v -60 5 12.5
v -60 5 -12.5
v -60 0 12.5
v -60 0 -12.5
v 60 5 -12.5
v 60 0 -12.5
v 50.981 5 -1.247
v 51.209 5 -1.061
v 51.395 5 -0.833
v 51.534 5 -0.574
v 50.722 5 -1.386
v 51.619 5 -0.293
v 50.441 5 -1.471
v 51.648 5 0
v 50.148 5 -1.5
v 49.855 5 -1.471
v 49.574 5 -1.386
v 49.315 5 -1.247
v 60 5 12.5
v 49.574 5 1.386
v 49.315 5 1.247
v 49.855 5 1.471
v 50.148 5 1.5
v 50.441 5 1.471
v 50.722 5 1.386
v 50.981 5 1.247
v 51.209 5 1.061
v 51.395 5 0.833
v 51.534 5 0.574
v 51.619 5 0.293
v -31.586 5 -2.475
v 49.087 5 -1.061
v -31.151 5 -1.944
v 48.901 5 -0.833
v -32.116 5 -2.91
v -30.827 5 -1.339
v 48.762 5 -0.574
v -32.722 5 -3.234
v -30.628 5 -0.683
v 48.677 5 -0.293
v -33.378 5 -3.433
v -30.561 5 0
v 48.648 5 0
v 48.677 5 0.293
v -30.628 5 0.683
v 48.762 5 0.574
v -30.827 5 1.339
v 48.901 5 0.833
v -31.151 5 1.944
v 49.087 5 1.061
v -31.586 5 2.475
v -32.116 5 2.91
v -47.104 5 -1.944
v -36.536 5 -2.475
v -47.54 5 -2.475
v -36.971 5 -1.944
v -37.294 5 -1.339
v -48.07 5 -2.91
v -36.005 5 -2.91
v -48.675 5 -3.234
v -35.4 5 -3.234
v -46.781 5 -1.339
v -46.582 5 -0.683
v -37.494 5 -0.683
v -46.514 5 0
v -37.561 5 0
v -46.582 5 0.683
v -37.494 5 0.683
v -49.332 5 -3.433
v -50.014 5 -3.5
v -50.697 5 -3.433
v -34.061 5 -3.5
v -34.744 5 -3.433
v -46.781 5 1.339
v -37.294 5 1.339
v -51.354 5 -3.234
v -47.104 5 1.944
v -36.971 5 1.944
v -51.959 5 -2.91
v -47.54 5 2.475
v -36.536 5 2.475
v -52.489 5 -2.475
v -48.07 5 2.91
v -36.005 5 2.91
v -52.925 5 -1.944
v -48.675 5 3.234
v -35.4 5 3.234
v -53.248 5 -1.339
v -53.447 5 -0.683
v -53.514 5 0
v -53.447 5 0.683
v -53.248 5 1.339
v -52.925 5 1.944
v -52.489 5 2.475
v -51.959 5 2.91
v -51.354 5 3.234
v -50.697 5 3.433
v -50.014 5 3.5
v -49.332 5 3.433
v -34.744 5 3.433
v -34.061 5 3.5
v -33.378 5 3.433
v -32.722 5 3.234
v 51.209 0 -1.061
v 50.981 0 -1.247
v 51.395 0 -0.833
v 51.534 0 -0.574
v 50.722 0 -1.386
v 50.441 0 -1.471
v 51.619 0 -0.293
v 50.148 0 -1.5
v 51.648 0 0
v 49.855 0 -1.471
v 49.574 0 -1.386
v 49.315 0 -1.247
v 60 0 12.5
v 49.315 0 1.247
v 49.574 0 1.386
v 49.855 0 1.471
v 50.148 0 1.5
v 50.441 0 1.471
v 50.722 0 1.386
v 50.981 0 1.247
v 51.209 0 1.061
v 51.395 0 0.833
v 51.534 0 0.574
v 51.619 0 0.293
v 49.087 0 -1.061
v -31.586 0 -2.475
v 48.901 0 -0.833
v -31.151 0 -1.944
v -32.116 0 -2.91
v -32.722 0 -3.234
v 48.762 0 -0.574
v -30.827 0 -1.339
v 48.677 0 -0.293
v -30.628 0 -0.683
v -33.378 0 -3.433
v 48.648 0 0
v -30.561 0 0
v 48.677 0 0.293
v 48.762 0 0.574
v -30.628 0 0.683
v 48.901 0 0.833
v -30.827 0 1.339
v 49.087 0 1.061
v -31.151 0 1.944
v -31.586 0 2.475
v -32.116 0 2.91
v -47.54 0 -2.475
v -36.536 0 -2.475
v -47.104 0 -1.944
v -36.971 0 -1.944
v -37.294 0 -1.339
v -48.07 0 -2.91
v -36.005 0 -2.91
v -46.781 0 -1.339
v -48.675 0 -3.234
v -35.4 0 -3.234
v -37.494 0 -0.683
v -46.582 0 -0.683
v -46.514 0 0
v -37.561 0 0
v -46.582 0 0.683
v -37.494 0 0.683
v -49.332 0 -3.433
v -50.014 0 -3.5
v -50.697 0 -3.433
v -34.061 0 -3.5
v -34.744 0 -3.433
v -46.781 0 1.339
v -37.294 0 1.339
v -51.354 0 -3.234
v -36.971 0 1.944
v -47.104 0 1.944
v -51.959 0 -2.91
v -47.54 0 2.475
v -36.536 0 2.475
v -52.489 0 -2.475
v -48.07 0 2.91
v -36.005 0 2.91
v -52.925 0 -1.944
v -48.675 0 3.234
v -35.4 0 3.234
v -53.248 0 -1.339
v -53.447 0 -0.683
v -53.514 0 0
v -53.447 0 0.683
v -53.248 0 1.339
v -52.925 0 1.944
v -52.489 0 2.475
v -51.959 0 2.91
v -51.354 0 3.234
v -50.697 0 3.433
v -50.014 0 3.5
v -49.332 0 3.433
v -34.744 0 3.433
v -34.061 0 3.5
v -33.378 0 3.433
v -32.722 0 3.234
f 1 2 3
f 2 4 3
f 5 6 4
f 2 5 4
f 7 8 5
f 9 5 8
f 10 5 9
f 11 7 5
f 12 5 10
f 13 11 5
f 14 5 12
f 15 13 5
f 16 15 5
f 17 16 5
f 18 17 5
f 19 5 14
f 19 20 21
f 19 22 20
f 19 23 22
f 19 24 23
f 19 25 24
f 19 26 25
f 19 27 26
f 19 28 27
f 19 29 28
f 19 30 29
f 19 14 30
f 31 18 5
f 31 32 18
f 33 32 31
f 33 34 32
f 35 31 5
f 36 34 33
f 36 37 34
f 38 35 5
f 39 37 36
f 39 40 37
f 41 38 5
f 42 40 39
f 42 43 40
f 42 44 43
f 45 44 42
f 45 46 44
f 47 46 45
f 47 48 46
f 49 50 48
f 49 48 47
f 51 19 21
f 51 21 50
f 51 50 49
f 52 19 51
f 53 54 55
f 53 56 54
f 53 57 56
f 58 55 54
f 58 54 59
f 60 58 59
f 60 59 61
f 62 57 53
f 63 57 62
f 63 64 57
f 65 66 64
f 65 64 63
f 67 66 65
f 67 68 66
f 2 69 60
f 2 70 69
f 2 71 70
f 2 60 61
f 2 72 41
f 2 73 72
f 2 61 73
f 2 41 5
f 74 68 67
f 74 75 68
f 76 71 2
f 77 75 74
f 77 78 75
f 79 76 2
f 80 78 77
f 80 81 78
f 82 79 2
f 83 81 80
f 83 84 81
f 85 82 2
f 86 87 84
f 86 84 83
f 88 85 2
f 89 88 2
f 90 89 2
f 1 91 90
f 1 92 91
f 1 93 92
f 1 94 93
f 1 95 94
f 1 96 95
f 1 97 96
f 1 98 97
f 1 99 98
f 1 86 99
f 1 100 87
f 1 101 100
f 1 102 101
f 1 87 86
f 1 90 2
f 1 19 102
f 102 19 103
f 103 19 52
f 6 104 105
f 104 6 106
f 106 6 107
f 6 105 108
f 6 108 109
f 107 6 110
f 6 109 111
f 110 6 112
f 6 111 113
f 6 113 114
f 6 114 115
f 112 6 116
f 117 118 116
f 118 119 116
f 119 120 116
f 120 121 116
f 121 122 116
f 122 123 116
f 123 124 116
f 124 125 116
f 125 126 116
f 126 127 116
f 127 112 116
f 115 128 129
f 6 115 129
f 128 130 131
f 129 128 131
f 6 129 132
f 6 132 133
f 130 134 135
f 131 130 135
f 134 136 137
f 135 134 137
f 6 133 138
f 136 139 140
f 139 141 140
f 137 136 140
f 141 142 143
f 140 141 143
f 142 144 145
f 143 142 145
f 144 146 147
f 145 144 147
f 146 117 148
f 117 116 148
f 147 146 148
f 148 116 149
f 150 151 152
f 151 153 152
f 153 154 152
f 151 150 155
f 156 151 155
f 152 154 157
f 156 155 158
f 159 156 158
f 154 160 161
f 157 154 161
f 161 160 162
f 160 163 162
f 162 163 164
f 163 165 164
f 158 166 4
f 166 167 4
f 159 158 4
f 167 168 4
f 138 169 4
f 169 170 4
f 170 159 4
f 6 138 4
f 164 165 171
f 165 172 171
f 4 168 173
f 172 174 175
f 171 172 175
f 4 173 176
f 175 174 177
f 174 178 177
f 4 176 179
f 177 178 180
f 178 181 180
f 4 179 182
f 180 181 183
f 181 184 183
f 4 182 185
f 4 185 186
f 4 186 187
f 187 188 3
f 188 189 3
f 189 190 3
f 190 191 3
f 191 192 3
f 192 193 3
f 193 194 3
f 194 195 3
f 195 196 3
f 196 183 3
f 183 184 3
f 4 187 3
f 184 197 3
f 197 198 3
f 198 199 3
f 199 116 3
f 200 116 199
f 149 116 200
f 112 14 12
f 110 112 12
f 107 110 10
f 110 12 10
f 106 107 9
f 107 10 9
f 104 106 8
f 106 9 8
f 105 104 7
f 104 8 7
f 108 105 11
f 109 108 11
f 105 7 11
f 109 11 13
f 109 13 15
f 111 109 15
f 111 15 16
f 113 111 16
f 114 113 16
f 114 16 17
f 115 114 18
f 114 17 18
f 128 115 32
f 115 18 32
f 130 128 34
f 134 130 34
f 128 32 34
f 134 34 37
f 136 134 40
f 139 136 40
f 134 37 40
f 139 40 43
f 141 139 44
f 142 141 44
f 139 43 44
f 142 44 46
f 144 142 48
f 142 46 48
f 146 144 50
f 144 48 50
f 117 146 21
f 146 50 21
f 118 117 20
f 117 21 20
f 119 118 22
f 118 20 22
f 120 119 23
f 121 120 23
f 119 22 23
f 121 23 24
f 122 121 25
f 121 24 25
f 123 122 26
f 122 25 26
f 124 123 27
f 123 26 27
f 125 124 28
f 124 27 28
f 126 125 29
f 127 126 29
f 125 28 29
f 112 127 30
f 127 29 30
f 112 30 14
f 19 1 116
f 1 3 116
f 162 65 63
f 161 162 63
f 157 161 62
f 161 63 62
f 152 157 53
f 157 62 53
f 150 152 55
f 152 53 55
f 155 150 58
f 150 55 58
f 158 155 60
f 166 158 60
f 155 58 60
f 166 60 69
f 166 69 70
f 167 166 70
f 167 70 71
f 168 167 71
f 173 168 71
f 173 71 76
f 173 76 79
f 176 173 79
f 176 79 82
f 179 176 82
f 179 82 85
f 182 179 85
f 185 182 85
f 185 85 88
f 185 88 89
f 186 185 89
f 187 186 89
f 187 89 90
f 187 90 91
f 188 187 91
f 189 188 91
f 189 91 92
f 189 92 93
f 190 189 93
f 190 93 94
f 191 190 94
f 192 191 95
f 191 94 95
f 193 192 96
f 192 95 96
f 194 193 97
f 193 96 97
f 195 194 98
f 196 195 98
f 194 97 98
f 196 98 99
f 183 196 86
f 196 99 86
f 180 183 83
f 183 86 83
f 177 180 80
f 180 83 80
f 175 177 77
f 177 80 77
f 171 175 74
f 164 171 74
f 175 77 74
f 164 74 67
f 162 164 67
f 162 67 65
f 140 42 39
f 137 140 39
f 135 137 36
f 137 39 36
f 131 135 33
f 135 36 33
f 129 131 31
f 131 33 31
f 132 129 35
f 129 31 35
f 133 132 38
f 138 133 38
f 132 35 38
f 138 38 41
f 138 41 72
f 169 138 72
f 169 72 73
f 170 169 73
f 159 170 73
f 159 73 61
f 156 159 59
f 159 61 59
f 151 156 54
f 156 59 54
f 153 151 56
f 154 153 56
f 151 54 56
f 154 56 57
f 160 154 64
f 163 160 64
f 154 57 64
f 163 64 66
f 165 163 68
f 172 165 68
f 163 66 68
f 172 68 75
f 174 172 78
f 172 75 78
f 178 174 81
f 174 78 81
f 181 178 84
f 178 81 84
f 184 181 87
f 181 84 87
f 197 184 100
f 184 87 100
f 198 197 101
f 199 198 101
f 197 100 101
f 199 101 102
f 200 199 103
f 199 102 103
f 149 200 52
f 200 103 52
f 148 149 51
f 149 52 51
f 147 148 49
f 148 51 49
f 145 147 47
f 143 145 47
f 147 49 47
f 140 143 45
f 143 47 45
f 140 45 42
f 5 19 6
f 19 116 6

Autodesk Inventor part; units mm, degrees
ref_plane "YZ Plane" through (0, 0, 0) normal (1, 0, 0) x (0, 1, 0)
ref_plane "XZ Plane" through (0, 0, 0) normal (0, 1, 0) x (-1, 0, 0)
ref_plane "XY Plane" through (0, 0, 0) normal (0, 0, 1) x (1, 0, 0)
sketch "Sketch1" plane through (0, 0, 0) normal (0, 1, 0) x (-1, 0, 0)
  line L0 (60, 12.5) -> (-60, 12.5)
  line L1 (-60, 12.5) -> (-60, -12.5)
  line L2 (-60, -12.5) -> (60, -12.5)
  line L3 (60, -12.5) -> (60, 12.5)
  line L4 (60, 12.5) -> (-60, -12.5) construction
  line L5 (-60, 12.5) -> (60, -12.5) construction
  point P0 (0, 0)
  dimension "d0" = 120
  dimension "d1" = 25
extrude "Extrusion1" add sketch "Sketch1" along normal blind 5
sketch "Sketch2" plane through (0, 5, 0) normal (0, 1, 0) x (1, 0, 0)
  circle A0 centre (-50.0145, 0) radius 3.5
  circle A1 centre (-34.0609, 0) radius 3.5
  point P0 (0, 0)
  dimension "d4" = 7
  dimension "d5" = 7
extrude "Extrusion2" cut sketch "Sketch2" against normal blind 20
sketch "Sketch3" plane through (0, 5, 0) normal (0, 1, 0) x (1, 0, 0)
  circle A0 centre (50.148, 0) radius 1.5
  point P0 (0, 0)
  dimension "d8" = 3
extrude "Extrusion3" cut sketch "Sketch3" against normal blind 20
properties part number "Stationary arm 2"
